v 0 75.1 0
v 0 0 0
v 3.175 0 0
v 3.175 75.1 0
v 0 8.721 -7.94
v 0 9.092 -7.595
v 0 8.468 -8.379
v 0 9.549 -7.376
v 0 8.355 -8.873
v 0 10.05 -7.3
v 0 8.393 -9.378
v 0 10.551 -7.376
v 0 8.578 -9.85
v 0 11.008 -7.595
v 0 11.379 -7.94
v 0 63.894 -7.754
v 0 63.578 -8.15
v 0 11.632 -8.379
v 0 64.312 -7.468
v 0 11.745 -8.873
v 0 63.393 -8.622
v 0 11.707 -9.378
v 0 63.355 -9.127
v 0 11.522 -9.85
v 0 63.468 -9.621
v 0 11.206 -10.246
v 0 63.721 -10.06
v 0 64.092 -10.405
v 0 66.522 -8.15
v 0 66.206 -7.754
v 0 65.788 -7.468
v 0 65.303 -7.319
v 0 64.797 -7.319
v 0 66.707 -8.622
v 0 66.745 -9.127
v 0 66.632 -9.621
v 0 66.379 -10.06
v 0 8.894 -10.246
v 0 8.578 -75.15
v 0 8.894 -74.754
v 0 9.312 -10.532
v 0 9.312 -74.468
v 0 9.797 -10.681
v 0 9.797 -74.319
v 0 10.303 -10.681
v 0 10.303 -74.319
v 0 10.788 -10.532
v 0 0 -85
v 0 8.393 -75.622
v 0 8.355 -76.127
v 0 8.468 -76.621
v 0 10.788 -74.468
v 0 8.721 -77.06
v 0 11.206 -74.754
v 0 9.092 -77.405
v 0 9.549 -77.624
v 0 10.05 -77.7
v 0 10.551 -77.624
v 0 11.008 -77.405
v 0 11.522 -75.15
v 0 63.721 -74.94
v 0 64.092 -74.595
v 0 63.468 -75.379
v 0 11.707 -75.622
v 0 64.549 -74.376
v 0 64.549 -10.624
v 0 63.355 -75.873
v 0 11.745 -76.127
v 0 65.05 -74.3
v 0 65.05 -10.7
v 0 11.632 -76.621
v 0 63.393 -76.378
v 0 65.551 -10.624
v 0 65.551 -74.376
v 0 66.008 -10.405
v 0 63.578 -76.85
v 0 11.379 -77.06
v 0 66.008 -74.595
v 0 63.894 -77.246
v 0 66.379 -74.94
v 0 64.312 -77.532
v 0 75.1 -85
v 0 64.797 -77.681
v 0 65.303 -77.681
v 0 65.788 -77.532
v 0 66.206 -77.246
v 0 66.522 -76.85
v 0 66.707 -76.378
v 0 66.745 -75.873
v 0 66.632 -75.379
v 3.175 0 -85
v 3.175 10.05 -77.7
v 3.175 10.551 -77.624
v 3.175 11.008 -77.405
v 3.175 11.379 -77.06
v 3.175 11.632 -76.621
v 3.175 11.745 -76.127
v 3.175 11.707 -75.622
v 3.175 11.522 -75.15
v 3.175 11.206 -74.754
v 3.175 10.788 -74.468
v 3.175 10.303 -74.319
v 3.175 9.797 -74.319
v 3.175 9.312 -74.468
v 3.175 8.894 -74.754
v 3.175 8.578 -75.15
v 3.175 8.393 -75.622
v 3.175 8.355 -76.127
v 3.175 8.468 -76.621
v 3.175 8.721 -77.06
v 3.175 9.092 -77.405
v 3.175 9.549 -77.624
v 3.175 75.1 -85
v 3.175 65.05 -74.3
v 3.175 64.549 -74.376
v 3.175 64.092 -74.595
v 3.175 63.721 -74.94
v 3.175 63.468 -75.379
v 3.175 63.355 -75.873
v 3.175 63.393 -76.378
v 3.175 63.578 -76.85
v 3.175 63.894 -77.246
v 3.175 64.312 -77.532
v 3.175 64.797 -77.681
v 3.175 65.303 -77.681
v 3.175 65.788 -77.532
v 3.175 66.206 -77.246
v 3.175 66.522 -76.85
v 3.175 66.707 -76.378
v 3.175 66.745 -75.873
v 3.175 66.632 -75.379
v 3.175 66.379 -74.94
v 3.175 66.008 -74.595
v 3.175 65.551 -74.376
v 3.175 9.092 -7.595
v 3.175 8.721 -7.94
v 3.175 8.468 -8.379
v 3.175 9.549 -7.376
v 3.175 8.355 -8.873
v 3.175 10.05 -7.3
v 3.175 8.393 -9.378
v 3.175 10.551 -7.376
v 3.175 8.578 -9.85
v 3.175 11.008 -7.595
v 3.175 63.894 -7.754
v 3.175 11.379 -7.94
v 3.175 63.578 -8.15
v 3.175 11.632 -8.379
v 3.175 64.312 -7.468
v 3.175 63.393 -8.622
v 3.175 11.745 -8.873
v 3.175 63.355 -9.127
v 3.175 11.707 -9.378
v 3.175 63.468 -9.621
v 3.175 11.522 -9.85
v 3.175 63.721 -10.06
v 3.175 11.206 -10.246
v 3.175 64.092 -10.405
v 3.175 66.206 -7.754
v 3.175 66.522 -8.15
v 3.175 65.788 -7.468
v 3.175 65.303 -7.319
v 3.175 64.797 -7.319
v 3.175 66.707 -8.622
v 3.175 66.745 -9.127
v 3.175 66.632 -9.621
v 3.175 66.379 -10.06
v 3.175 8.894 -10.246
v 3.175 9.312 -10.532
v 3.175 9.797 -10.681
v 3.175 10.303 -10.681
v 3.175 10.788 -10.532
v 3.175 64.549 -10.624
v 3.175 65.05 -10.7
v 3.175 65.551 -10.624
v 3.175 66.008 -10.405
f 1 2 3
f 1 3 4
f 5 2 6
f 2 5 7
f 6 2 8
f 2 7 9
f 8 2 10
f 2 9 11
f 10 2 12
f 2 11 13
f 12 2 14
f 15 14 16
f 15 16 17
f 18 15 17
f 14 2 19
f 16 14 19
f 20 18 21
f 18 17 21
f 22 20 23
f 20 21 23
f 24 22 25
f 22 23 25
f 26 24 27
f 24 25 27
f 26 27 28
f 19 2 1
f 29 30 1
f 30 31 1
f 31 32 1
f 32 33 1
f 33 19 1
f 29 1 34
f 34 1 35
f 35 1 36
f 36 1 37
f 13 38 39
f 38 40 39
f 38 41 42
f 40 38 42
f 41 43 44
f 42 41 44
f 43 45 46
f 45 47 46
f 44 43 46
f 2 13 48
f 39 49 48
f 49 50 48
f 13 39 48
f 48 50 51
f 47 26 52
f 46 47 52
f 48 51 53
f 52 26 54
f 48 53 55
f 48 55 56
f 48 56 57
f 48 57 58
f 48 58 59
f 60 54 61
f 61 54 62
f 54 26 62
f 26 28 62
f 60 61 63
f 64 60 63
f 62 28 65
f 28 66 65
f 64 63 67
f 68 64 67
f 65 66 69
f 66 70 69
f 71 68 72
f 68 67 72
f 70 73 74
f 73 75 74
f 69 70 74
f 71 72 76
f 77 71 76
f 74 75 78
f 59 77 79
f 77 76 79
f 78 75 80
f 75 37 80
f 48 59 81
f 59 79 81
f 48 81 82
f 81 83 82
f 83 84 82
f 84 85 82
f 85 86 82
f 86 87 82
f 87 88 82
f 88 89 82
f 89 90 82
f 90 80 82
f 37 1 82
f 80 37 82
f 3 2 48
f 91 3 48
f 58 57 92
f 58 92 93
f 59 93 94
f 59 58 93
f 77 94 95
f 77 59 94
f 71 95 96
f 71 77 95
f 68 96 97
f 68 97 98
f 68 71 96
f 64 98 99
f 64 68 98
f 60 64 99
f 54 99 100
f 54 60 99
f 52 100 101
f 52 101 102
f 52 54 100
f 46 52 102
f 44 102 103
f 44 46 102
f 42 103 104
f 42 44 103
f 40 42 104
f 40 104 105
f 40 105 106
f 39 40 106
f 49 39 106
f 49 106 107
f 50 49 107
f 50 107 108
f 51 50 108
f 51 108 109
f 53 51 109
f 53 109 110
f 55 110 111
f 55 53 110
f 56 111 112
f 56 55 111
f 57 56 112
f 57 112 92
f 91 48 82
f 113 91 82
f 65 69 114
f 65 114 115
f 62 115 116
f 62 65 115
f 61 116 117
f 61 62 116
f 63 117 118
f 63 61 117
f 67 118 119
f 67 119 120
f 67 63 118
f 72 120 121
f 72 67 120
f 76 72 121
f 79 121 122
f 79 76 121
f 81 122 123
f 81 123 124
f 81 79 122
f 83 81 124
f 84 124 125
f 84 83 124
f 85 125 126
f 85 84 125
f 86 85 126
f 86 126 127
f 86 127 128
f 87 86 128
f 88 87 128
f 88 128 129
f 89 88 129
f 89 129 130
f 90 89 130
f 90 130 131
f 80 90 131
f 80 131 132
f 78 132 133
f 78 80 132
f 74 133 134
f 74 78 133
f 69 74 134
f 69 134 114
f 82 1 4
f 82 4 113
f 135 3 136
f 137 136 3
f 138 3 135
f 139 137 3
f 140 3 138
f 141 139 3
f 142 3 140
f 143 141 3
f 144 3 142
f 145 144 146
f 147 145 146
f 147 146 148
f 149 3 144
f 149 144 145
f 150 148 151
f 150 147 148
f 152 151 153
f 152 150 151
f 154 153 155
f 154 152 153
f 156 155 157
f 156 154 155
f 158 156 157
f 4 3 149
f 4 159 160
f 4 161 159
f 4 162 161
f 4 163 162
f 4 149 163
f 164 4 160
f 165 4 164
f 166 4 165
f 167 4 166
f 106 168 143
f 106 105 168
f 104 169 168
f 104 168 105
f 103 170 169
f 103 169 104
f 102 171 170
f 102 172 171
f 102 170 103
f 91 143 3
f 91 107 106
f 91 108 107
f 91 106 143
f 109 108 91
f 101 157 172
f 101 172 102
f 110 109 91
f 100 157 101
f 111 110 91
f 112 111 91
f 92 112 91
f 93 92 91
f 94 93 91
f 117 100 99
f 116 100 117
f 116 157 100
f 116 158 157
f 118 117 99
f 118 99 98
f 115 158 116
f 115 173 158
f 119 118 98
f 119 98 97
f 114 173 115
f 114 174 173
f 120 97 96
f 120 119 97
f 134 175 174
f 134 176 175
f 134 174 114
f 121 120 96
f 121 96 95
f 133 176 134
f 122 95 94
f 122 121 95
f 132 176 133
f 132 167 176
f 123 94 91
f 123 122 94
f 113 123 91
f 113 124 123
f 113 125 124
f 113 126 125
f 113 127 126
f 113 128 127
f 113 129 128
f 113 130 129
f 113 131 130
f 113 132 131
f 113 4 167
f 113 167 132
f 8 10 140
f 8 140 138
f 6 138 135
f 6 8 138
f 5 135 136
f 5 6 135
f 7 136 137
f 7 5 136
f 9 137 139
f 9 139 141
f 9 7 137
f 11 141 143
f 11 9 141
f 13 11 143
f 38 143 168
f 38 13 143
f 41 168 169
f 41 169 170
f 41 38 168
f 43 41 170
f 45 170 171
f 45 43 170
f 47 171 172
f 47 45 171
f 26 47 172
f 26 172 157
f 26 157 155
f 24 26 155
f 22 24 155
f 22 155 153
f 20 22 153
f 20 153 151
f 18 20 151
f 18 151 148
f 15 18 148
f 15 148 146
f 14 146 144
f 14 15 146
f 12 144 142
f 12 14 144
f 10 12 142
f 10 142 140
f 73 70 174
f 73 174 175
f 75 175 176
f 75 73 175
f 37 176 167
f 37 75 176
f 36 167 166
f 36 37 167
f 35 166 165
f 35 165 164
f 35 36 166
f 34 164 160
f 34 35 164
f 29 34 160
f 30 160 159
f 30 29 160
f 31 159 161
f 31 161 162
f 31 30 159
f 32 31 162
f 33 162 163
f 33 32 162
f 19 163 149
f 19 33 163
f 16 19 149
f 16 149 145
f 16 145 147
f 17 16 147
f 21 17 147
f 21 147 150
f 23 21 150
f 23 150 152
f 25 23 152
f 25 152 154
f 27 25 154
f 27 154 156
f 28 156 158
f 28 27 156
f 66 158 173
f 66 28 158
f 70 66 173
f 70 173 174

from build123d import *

# Parameters (mm, degrees)
SKETCH1_W           = 85
SKETCH1_H           = 75.1
SKETCH1_R           = 1.7
BOSS_EXTRUDE1_DEPTH = 3.175


with BuildPart() as part:
    # Sketch1 → Boss-Extrude1 (new body)
    with BuildSketch(Plane(origin=(0, 0, 0), x_dir=(0, 0, -1), z_dir=(1, 0, 0))):
        with Locations((42.5, 37.55)):
            Rectangle(SKETCH1_W, SKETCH1_H)
        with Locations((9, 65.05)):
            Circle(SKETCH1_R, mode=Mode.SUBTRACT)
        with Locations(Location((9, 10.05, 0), (0, 0, 180))):
            Circle(SKETCH1_R, mode=Mode.SUBTRACT)
        with Locations((76, 10.05)):
            Circle(SKETCH1_R, mode=Mode.SUBTRACT)
        with Locations(Location((76, 65.05, 0), (0, 0, 180))):
            Circle(SKETCH1_R, mode=Mode.SUBTRACT)
    extrude(amount=BOSS_EXTRUDE1_DEPTH)


solid = part.part
